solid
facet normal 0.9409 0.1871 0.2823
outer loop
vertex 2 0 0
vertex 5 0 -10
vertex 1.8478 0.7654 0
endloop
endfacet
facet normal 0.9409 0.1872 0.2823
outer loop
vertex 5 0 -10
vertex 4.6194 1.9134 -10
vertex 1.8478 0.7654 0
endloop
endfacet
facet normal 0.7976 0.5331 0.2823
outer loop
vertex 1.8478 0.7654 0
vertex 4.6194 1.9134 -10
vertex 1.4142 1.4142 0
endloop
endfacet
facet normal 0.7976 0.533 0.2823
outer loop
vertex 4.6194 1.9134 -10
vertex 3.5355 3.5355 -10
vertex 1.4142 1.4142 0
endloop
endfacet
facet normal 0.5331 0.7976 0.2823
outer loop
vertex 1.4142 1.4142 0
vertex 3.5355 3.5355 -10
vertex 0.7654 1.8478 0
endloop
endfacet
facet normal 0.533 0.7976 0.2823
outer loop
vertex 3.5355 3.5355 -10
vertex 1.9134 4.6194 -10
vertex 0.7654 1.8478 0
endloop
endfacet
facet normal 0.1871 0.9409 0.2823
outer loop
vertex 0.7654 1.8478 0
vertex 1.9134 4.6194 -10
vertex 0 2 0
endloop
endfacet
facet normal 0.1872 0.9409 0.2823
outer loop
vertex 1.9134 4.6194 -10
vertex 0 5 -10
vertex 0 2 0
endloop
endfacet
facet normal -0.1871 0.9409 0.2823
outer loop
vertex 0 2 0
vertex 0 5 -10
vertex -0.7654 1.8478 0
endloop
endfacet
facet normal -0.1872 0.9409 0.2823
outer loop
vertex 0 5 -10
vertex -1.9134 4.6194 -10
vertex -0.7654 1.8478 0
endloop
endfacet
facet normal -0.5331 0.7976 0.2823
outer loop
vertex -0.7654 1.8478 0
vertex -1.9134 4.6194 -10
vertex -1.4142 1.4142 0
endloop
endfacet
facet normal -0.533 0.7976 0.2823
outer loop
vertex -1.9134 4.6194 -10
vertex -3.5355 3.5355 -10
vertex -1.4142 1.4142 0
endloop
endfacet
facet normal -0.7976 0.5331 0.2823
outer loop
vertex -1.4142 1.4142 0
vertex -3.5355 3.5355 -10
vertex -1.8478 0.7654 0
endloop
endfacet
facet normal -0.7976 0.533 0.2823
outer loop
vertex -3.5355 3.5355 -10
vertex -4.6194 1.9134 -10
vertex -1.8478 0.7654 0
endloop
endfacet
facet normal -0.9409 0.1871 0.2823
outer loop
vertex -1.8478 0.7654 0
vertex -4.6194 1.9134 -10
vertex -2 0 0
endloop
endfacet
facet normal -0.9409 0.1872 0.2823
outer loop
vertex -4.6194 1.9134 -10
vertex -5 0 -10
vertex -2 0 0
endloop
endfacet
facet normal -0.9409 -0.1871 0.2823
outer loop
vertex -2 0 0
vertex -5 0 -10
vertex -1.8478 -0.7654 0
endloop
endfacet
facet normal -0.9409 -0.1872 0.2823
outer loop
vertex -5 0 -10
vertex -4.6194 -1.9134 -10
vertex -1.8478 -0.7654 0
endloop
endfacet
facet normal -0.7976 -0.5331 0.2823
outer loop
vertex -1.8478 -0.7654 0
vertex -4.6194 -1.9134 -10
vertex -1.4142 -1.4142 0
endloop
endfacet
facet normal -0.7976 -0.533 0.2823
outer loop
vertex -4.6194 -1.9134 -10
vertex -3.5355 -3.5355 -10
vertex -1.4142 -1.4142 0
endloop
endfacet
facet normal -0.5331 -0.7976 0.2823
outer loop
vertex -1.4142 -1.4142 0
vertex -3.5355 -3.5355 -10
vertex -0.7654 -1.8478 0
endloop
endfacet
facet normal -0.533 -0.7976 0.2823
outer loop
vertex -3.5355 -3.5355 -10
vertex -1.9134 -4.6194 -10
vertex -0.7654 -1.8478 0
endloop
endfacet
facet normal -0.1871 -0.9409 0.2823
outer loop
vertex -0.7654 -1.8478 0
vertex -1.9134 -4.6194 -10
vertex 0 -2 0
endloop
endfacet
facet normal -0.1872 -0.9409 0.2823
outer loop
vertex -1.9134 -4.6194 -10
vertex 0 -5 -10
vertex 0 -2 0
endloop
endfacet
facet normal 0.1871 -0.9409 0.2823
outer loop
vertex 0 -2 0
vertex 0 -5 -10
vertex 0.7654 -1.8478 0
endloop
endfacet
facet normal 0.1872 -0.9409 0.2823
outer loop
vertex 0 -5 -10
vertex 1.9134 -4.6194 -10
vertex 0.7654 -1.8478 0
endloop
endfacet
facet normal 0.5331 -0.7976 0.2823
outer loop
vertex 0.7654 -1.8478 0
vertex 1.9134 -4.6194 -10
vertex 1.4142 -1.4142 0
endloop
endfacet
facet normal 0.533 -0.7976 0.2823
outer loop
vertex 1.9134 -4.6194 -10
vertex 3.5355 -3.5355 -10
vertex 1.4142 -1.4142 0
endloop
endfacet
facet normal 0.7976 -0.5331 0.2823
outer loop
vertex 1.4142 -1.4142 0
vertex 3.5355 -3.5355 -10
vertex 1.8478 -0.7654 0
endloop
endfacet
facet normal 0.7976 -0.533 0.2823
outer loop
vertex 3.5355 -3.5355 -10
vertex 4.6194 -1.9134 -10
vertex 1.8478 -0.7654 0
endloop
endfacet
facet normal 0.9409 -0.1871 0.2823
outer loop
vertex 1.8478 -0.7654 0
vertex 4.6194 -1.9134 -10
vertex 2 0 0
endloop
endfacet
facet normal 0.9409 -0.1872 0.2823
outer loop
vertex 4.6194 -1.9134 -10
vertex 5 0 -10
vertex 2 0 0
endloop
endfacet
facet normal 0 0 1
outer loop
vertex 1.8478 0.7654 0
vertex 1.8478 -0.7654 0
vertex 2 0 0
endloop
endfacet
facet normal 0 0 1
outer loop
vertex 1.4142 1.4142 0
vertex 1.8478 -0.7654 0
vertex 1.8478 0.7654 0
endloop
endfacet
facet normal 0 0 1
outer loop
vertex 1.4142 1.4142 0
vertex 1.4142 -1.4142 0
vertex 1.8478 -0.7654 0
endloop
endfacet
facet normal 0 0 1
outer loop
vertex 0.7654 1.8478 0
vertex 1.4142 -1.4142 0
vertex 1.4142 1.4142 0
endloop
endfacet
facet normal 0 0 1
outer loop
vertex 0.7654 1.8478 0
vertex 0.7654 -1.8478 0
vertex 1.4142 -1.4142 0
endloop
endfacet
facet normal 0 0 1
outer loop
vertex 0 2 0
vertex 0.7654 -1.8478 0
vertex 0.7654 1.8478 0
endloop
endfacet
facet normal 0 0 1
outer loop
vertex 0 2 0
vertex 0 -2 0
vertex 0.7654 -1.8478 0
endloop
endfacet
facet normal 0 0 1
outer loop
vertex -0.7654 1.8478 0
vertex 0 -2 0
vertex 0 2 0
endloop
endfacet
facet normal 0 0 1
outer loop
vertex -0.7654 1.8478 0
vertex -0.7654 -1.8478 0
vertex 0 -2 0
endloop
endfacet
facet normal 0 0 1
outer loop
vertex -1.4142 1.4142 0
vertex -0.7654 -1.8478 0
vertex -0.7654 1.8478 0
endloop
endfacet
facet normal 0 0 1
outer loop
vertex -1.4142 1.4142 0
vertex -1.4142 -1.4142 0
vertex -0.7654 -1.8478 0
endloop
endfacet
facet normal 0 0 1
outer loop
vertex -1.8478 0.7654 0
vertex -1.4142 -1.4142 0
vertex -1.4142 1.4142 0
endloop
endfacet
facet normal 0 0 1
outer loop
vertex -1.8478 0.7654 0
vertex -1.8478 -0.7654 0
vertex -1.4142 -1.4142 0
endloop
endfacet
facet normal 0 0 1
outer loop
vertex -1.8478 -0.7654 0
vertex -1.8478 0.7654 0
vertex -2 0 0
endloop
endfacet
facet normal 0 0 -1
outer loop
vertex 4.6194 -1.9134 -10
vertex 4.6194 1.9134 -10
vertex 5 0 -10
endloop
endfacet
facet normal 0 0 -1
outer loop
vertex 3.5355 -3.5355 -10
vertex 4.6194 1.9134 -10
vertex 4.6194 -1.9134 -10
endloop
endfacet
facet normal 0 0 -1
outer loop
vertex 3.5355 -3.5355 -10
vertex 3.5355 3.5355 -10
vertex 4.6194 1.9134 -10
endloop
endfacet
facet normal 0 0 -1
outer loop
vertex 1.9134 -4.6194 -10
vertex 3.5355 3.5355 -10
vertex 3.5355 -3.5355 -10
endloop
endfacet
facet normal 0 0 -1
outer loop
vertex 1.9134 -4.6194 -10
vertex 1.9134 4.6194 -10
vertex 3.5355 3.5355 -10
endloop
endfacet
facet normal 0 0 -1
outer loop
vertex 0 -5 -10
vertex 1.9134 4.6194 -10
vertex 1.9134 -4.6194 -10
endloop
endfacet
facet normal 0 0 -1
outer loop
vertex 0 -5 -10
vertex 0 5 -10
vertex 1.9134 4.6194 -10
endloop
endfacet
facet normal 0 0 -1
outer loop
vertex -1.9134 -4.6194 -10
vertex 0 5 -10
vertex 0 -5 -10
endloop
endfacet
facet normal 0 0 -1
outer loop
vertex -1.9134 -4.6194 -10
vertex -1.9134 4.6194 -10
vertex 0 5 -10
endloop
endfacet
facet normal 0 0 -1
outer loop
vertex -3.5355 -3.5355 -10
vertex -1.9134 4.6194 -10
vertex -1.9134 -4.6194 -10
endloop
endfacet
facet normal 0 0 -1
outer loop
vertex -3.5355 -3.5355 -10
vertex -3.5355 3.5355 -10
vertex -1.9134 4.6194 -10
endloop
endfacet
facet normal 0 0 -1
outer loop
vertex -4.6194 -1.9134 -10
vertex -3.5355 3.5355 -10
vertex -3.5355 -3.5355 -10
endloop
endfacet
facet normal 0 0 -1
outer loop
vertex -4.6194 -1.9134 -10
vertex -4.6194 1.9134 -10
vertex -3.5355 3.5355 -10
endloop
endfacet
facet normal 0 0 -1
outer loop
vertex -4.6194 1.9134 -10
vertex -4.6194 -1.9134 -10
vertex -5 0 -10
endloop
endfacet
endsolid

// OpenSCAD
mirror([0, 0, 10]) cylinder(h=10, r1=2, r2=5);

%cylinder(h=10, r1=2, r2=5);
